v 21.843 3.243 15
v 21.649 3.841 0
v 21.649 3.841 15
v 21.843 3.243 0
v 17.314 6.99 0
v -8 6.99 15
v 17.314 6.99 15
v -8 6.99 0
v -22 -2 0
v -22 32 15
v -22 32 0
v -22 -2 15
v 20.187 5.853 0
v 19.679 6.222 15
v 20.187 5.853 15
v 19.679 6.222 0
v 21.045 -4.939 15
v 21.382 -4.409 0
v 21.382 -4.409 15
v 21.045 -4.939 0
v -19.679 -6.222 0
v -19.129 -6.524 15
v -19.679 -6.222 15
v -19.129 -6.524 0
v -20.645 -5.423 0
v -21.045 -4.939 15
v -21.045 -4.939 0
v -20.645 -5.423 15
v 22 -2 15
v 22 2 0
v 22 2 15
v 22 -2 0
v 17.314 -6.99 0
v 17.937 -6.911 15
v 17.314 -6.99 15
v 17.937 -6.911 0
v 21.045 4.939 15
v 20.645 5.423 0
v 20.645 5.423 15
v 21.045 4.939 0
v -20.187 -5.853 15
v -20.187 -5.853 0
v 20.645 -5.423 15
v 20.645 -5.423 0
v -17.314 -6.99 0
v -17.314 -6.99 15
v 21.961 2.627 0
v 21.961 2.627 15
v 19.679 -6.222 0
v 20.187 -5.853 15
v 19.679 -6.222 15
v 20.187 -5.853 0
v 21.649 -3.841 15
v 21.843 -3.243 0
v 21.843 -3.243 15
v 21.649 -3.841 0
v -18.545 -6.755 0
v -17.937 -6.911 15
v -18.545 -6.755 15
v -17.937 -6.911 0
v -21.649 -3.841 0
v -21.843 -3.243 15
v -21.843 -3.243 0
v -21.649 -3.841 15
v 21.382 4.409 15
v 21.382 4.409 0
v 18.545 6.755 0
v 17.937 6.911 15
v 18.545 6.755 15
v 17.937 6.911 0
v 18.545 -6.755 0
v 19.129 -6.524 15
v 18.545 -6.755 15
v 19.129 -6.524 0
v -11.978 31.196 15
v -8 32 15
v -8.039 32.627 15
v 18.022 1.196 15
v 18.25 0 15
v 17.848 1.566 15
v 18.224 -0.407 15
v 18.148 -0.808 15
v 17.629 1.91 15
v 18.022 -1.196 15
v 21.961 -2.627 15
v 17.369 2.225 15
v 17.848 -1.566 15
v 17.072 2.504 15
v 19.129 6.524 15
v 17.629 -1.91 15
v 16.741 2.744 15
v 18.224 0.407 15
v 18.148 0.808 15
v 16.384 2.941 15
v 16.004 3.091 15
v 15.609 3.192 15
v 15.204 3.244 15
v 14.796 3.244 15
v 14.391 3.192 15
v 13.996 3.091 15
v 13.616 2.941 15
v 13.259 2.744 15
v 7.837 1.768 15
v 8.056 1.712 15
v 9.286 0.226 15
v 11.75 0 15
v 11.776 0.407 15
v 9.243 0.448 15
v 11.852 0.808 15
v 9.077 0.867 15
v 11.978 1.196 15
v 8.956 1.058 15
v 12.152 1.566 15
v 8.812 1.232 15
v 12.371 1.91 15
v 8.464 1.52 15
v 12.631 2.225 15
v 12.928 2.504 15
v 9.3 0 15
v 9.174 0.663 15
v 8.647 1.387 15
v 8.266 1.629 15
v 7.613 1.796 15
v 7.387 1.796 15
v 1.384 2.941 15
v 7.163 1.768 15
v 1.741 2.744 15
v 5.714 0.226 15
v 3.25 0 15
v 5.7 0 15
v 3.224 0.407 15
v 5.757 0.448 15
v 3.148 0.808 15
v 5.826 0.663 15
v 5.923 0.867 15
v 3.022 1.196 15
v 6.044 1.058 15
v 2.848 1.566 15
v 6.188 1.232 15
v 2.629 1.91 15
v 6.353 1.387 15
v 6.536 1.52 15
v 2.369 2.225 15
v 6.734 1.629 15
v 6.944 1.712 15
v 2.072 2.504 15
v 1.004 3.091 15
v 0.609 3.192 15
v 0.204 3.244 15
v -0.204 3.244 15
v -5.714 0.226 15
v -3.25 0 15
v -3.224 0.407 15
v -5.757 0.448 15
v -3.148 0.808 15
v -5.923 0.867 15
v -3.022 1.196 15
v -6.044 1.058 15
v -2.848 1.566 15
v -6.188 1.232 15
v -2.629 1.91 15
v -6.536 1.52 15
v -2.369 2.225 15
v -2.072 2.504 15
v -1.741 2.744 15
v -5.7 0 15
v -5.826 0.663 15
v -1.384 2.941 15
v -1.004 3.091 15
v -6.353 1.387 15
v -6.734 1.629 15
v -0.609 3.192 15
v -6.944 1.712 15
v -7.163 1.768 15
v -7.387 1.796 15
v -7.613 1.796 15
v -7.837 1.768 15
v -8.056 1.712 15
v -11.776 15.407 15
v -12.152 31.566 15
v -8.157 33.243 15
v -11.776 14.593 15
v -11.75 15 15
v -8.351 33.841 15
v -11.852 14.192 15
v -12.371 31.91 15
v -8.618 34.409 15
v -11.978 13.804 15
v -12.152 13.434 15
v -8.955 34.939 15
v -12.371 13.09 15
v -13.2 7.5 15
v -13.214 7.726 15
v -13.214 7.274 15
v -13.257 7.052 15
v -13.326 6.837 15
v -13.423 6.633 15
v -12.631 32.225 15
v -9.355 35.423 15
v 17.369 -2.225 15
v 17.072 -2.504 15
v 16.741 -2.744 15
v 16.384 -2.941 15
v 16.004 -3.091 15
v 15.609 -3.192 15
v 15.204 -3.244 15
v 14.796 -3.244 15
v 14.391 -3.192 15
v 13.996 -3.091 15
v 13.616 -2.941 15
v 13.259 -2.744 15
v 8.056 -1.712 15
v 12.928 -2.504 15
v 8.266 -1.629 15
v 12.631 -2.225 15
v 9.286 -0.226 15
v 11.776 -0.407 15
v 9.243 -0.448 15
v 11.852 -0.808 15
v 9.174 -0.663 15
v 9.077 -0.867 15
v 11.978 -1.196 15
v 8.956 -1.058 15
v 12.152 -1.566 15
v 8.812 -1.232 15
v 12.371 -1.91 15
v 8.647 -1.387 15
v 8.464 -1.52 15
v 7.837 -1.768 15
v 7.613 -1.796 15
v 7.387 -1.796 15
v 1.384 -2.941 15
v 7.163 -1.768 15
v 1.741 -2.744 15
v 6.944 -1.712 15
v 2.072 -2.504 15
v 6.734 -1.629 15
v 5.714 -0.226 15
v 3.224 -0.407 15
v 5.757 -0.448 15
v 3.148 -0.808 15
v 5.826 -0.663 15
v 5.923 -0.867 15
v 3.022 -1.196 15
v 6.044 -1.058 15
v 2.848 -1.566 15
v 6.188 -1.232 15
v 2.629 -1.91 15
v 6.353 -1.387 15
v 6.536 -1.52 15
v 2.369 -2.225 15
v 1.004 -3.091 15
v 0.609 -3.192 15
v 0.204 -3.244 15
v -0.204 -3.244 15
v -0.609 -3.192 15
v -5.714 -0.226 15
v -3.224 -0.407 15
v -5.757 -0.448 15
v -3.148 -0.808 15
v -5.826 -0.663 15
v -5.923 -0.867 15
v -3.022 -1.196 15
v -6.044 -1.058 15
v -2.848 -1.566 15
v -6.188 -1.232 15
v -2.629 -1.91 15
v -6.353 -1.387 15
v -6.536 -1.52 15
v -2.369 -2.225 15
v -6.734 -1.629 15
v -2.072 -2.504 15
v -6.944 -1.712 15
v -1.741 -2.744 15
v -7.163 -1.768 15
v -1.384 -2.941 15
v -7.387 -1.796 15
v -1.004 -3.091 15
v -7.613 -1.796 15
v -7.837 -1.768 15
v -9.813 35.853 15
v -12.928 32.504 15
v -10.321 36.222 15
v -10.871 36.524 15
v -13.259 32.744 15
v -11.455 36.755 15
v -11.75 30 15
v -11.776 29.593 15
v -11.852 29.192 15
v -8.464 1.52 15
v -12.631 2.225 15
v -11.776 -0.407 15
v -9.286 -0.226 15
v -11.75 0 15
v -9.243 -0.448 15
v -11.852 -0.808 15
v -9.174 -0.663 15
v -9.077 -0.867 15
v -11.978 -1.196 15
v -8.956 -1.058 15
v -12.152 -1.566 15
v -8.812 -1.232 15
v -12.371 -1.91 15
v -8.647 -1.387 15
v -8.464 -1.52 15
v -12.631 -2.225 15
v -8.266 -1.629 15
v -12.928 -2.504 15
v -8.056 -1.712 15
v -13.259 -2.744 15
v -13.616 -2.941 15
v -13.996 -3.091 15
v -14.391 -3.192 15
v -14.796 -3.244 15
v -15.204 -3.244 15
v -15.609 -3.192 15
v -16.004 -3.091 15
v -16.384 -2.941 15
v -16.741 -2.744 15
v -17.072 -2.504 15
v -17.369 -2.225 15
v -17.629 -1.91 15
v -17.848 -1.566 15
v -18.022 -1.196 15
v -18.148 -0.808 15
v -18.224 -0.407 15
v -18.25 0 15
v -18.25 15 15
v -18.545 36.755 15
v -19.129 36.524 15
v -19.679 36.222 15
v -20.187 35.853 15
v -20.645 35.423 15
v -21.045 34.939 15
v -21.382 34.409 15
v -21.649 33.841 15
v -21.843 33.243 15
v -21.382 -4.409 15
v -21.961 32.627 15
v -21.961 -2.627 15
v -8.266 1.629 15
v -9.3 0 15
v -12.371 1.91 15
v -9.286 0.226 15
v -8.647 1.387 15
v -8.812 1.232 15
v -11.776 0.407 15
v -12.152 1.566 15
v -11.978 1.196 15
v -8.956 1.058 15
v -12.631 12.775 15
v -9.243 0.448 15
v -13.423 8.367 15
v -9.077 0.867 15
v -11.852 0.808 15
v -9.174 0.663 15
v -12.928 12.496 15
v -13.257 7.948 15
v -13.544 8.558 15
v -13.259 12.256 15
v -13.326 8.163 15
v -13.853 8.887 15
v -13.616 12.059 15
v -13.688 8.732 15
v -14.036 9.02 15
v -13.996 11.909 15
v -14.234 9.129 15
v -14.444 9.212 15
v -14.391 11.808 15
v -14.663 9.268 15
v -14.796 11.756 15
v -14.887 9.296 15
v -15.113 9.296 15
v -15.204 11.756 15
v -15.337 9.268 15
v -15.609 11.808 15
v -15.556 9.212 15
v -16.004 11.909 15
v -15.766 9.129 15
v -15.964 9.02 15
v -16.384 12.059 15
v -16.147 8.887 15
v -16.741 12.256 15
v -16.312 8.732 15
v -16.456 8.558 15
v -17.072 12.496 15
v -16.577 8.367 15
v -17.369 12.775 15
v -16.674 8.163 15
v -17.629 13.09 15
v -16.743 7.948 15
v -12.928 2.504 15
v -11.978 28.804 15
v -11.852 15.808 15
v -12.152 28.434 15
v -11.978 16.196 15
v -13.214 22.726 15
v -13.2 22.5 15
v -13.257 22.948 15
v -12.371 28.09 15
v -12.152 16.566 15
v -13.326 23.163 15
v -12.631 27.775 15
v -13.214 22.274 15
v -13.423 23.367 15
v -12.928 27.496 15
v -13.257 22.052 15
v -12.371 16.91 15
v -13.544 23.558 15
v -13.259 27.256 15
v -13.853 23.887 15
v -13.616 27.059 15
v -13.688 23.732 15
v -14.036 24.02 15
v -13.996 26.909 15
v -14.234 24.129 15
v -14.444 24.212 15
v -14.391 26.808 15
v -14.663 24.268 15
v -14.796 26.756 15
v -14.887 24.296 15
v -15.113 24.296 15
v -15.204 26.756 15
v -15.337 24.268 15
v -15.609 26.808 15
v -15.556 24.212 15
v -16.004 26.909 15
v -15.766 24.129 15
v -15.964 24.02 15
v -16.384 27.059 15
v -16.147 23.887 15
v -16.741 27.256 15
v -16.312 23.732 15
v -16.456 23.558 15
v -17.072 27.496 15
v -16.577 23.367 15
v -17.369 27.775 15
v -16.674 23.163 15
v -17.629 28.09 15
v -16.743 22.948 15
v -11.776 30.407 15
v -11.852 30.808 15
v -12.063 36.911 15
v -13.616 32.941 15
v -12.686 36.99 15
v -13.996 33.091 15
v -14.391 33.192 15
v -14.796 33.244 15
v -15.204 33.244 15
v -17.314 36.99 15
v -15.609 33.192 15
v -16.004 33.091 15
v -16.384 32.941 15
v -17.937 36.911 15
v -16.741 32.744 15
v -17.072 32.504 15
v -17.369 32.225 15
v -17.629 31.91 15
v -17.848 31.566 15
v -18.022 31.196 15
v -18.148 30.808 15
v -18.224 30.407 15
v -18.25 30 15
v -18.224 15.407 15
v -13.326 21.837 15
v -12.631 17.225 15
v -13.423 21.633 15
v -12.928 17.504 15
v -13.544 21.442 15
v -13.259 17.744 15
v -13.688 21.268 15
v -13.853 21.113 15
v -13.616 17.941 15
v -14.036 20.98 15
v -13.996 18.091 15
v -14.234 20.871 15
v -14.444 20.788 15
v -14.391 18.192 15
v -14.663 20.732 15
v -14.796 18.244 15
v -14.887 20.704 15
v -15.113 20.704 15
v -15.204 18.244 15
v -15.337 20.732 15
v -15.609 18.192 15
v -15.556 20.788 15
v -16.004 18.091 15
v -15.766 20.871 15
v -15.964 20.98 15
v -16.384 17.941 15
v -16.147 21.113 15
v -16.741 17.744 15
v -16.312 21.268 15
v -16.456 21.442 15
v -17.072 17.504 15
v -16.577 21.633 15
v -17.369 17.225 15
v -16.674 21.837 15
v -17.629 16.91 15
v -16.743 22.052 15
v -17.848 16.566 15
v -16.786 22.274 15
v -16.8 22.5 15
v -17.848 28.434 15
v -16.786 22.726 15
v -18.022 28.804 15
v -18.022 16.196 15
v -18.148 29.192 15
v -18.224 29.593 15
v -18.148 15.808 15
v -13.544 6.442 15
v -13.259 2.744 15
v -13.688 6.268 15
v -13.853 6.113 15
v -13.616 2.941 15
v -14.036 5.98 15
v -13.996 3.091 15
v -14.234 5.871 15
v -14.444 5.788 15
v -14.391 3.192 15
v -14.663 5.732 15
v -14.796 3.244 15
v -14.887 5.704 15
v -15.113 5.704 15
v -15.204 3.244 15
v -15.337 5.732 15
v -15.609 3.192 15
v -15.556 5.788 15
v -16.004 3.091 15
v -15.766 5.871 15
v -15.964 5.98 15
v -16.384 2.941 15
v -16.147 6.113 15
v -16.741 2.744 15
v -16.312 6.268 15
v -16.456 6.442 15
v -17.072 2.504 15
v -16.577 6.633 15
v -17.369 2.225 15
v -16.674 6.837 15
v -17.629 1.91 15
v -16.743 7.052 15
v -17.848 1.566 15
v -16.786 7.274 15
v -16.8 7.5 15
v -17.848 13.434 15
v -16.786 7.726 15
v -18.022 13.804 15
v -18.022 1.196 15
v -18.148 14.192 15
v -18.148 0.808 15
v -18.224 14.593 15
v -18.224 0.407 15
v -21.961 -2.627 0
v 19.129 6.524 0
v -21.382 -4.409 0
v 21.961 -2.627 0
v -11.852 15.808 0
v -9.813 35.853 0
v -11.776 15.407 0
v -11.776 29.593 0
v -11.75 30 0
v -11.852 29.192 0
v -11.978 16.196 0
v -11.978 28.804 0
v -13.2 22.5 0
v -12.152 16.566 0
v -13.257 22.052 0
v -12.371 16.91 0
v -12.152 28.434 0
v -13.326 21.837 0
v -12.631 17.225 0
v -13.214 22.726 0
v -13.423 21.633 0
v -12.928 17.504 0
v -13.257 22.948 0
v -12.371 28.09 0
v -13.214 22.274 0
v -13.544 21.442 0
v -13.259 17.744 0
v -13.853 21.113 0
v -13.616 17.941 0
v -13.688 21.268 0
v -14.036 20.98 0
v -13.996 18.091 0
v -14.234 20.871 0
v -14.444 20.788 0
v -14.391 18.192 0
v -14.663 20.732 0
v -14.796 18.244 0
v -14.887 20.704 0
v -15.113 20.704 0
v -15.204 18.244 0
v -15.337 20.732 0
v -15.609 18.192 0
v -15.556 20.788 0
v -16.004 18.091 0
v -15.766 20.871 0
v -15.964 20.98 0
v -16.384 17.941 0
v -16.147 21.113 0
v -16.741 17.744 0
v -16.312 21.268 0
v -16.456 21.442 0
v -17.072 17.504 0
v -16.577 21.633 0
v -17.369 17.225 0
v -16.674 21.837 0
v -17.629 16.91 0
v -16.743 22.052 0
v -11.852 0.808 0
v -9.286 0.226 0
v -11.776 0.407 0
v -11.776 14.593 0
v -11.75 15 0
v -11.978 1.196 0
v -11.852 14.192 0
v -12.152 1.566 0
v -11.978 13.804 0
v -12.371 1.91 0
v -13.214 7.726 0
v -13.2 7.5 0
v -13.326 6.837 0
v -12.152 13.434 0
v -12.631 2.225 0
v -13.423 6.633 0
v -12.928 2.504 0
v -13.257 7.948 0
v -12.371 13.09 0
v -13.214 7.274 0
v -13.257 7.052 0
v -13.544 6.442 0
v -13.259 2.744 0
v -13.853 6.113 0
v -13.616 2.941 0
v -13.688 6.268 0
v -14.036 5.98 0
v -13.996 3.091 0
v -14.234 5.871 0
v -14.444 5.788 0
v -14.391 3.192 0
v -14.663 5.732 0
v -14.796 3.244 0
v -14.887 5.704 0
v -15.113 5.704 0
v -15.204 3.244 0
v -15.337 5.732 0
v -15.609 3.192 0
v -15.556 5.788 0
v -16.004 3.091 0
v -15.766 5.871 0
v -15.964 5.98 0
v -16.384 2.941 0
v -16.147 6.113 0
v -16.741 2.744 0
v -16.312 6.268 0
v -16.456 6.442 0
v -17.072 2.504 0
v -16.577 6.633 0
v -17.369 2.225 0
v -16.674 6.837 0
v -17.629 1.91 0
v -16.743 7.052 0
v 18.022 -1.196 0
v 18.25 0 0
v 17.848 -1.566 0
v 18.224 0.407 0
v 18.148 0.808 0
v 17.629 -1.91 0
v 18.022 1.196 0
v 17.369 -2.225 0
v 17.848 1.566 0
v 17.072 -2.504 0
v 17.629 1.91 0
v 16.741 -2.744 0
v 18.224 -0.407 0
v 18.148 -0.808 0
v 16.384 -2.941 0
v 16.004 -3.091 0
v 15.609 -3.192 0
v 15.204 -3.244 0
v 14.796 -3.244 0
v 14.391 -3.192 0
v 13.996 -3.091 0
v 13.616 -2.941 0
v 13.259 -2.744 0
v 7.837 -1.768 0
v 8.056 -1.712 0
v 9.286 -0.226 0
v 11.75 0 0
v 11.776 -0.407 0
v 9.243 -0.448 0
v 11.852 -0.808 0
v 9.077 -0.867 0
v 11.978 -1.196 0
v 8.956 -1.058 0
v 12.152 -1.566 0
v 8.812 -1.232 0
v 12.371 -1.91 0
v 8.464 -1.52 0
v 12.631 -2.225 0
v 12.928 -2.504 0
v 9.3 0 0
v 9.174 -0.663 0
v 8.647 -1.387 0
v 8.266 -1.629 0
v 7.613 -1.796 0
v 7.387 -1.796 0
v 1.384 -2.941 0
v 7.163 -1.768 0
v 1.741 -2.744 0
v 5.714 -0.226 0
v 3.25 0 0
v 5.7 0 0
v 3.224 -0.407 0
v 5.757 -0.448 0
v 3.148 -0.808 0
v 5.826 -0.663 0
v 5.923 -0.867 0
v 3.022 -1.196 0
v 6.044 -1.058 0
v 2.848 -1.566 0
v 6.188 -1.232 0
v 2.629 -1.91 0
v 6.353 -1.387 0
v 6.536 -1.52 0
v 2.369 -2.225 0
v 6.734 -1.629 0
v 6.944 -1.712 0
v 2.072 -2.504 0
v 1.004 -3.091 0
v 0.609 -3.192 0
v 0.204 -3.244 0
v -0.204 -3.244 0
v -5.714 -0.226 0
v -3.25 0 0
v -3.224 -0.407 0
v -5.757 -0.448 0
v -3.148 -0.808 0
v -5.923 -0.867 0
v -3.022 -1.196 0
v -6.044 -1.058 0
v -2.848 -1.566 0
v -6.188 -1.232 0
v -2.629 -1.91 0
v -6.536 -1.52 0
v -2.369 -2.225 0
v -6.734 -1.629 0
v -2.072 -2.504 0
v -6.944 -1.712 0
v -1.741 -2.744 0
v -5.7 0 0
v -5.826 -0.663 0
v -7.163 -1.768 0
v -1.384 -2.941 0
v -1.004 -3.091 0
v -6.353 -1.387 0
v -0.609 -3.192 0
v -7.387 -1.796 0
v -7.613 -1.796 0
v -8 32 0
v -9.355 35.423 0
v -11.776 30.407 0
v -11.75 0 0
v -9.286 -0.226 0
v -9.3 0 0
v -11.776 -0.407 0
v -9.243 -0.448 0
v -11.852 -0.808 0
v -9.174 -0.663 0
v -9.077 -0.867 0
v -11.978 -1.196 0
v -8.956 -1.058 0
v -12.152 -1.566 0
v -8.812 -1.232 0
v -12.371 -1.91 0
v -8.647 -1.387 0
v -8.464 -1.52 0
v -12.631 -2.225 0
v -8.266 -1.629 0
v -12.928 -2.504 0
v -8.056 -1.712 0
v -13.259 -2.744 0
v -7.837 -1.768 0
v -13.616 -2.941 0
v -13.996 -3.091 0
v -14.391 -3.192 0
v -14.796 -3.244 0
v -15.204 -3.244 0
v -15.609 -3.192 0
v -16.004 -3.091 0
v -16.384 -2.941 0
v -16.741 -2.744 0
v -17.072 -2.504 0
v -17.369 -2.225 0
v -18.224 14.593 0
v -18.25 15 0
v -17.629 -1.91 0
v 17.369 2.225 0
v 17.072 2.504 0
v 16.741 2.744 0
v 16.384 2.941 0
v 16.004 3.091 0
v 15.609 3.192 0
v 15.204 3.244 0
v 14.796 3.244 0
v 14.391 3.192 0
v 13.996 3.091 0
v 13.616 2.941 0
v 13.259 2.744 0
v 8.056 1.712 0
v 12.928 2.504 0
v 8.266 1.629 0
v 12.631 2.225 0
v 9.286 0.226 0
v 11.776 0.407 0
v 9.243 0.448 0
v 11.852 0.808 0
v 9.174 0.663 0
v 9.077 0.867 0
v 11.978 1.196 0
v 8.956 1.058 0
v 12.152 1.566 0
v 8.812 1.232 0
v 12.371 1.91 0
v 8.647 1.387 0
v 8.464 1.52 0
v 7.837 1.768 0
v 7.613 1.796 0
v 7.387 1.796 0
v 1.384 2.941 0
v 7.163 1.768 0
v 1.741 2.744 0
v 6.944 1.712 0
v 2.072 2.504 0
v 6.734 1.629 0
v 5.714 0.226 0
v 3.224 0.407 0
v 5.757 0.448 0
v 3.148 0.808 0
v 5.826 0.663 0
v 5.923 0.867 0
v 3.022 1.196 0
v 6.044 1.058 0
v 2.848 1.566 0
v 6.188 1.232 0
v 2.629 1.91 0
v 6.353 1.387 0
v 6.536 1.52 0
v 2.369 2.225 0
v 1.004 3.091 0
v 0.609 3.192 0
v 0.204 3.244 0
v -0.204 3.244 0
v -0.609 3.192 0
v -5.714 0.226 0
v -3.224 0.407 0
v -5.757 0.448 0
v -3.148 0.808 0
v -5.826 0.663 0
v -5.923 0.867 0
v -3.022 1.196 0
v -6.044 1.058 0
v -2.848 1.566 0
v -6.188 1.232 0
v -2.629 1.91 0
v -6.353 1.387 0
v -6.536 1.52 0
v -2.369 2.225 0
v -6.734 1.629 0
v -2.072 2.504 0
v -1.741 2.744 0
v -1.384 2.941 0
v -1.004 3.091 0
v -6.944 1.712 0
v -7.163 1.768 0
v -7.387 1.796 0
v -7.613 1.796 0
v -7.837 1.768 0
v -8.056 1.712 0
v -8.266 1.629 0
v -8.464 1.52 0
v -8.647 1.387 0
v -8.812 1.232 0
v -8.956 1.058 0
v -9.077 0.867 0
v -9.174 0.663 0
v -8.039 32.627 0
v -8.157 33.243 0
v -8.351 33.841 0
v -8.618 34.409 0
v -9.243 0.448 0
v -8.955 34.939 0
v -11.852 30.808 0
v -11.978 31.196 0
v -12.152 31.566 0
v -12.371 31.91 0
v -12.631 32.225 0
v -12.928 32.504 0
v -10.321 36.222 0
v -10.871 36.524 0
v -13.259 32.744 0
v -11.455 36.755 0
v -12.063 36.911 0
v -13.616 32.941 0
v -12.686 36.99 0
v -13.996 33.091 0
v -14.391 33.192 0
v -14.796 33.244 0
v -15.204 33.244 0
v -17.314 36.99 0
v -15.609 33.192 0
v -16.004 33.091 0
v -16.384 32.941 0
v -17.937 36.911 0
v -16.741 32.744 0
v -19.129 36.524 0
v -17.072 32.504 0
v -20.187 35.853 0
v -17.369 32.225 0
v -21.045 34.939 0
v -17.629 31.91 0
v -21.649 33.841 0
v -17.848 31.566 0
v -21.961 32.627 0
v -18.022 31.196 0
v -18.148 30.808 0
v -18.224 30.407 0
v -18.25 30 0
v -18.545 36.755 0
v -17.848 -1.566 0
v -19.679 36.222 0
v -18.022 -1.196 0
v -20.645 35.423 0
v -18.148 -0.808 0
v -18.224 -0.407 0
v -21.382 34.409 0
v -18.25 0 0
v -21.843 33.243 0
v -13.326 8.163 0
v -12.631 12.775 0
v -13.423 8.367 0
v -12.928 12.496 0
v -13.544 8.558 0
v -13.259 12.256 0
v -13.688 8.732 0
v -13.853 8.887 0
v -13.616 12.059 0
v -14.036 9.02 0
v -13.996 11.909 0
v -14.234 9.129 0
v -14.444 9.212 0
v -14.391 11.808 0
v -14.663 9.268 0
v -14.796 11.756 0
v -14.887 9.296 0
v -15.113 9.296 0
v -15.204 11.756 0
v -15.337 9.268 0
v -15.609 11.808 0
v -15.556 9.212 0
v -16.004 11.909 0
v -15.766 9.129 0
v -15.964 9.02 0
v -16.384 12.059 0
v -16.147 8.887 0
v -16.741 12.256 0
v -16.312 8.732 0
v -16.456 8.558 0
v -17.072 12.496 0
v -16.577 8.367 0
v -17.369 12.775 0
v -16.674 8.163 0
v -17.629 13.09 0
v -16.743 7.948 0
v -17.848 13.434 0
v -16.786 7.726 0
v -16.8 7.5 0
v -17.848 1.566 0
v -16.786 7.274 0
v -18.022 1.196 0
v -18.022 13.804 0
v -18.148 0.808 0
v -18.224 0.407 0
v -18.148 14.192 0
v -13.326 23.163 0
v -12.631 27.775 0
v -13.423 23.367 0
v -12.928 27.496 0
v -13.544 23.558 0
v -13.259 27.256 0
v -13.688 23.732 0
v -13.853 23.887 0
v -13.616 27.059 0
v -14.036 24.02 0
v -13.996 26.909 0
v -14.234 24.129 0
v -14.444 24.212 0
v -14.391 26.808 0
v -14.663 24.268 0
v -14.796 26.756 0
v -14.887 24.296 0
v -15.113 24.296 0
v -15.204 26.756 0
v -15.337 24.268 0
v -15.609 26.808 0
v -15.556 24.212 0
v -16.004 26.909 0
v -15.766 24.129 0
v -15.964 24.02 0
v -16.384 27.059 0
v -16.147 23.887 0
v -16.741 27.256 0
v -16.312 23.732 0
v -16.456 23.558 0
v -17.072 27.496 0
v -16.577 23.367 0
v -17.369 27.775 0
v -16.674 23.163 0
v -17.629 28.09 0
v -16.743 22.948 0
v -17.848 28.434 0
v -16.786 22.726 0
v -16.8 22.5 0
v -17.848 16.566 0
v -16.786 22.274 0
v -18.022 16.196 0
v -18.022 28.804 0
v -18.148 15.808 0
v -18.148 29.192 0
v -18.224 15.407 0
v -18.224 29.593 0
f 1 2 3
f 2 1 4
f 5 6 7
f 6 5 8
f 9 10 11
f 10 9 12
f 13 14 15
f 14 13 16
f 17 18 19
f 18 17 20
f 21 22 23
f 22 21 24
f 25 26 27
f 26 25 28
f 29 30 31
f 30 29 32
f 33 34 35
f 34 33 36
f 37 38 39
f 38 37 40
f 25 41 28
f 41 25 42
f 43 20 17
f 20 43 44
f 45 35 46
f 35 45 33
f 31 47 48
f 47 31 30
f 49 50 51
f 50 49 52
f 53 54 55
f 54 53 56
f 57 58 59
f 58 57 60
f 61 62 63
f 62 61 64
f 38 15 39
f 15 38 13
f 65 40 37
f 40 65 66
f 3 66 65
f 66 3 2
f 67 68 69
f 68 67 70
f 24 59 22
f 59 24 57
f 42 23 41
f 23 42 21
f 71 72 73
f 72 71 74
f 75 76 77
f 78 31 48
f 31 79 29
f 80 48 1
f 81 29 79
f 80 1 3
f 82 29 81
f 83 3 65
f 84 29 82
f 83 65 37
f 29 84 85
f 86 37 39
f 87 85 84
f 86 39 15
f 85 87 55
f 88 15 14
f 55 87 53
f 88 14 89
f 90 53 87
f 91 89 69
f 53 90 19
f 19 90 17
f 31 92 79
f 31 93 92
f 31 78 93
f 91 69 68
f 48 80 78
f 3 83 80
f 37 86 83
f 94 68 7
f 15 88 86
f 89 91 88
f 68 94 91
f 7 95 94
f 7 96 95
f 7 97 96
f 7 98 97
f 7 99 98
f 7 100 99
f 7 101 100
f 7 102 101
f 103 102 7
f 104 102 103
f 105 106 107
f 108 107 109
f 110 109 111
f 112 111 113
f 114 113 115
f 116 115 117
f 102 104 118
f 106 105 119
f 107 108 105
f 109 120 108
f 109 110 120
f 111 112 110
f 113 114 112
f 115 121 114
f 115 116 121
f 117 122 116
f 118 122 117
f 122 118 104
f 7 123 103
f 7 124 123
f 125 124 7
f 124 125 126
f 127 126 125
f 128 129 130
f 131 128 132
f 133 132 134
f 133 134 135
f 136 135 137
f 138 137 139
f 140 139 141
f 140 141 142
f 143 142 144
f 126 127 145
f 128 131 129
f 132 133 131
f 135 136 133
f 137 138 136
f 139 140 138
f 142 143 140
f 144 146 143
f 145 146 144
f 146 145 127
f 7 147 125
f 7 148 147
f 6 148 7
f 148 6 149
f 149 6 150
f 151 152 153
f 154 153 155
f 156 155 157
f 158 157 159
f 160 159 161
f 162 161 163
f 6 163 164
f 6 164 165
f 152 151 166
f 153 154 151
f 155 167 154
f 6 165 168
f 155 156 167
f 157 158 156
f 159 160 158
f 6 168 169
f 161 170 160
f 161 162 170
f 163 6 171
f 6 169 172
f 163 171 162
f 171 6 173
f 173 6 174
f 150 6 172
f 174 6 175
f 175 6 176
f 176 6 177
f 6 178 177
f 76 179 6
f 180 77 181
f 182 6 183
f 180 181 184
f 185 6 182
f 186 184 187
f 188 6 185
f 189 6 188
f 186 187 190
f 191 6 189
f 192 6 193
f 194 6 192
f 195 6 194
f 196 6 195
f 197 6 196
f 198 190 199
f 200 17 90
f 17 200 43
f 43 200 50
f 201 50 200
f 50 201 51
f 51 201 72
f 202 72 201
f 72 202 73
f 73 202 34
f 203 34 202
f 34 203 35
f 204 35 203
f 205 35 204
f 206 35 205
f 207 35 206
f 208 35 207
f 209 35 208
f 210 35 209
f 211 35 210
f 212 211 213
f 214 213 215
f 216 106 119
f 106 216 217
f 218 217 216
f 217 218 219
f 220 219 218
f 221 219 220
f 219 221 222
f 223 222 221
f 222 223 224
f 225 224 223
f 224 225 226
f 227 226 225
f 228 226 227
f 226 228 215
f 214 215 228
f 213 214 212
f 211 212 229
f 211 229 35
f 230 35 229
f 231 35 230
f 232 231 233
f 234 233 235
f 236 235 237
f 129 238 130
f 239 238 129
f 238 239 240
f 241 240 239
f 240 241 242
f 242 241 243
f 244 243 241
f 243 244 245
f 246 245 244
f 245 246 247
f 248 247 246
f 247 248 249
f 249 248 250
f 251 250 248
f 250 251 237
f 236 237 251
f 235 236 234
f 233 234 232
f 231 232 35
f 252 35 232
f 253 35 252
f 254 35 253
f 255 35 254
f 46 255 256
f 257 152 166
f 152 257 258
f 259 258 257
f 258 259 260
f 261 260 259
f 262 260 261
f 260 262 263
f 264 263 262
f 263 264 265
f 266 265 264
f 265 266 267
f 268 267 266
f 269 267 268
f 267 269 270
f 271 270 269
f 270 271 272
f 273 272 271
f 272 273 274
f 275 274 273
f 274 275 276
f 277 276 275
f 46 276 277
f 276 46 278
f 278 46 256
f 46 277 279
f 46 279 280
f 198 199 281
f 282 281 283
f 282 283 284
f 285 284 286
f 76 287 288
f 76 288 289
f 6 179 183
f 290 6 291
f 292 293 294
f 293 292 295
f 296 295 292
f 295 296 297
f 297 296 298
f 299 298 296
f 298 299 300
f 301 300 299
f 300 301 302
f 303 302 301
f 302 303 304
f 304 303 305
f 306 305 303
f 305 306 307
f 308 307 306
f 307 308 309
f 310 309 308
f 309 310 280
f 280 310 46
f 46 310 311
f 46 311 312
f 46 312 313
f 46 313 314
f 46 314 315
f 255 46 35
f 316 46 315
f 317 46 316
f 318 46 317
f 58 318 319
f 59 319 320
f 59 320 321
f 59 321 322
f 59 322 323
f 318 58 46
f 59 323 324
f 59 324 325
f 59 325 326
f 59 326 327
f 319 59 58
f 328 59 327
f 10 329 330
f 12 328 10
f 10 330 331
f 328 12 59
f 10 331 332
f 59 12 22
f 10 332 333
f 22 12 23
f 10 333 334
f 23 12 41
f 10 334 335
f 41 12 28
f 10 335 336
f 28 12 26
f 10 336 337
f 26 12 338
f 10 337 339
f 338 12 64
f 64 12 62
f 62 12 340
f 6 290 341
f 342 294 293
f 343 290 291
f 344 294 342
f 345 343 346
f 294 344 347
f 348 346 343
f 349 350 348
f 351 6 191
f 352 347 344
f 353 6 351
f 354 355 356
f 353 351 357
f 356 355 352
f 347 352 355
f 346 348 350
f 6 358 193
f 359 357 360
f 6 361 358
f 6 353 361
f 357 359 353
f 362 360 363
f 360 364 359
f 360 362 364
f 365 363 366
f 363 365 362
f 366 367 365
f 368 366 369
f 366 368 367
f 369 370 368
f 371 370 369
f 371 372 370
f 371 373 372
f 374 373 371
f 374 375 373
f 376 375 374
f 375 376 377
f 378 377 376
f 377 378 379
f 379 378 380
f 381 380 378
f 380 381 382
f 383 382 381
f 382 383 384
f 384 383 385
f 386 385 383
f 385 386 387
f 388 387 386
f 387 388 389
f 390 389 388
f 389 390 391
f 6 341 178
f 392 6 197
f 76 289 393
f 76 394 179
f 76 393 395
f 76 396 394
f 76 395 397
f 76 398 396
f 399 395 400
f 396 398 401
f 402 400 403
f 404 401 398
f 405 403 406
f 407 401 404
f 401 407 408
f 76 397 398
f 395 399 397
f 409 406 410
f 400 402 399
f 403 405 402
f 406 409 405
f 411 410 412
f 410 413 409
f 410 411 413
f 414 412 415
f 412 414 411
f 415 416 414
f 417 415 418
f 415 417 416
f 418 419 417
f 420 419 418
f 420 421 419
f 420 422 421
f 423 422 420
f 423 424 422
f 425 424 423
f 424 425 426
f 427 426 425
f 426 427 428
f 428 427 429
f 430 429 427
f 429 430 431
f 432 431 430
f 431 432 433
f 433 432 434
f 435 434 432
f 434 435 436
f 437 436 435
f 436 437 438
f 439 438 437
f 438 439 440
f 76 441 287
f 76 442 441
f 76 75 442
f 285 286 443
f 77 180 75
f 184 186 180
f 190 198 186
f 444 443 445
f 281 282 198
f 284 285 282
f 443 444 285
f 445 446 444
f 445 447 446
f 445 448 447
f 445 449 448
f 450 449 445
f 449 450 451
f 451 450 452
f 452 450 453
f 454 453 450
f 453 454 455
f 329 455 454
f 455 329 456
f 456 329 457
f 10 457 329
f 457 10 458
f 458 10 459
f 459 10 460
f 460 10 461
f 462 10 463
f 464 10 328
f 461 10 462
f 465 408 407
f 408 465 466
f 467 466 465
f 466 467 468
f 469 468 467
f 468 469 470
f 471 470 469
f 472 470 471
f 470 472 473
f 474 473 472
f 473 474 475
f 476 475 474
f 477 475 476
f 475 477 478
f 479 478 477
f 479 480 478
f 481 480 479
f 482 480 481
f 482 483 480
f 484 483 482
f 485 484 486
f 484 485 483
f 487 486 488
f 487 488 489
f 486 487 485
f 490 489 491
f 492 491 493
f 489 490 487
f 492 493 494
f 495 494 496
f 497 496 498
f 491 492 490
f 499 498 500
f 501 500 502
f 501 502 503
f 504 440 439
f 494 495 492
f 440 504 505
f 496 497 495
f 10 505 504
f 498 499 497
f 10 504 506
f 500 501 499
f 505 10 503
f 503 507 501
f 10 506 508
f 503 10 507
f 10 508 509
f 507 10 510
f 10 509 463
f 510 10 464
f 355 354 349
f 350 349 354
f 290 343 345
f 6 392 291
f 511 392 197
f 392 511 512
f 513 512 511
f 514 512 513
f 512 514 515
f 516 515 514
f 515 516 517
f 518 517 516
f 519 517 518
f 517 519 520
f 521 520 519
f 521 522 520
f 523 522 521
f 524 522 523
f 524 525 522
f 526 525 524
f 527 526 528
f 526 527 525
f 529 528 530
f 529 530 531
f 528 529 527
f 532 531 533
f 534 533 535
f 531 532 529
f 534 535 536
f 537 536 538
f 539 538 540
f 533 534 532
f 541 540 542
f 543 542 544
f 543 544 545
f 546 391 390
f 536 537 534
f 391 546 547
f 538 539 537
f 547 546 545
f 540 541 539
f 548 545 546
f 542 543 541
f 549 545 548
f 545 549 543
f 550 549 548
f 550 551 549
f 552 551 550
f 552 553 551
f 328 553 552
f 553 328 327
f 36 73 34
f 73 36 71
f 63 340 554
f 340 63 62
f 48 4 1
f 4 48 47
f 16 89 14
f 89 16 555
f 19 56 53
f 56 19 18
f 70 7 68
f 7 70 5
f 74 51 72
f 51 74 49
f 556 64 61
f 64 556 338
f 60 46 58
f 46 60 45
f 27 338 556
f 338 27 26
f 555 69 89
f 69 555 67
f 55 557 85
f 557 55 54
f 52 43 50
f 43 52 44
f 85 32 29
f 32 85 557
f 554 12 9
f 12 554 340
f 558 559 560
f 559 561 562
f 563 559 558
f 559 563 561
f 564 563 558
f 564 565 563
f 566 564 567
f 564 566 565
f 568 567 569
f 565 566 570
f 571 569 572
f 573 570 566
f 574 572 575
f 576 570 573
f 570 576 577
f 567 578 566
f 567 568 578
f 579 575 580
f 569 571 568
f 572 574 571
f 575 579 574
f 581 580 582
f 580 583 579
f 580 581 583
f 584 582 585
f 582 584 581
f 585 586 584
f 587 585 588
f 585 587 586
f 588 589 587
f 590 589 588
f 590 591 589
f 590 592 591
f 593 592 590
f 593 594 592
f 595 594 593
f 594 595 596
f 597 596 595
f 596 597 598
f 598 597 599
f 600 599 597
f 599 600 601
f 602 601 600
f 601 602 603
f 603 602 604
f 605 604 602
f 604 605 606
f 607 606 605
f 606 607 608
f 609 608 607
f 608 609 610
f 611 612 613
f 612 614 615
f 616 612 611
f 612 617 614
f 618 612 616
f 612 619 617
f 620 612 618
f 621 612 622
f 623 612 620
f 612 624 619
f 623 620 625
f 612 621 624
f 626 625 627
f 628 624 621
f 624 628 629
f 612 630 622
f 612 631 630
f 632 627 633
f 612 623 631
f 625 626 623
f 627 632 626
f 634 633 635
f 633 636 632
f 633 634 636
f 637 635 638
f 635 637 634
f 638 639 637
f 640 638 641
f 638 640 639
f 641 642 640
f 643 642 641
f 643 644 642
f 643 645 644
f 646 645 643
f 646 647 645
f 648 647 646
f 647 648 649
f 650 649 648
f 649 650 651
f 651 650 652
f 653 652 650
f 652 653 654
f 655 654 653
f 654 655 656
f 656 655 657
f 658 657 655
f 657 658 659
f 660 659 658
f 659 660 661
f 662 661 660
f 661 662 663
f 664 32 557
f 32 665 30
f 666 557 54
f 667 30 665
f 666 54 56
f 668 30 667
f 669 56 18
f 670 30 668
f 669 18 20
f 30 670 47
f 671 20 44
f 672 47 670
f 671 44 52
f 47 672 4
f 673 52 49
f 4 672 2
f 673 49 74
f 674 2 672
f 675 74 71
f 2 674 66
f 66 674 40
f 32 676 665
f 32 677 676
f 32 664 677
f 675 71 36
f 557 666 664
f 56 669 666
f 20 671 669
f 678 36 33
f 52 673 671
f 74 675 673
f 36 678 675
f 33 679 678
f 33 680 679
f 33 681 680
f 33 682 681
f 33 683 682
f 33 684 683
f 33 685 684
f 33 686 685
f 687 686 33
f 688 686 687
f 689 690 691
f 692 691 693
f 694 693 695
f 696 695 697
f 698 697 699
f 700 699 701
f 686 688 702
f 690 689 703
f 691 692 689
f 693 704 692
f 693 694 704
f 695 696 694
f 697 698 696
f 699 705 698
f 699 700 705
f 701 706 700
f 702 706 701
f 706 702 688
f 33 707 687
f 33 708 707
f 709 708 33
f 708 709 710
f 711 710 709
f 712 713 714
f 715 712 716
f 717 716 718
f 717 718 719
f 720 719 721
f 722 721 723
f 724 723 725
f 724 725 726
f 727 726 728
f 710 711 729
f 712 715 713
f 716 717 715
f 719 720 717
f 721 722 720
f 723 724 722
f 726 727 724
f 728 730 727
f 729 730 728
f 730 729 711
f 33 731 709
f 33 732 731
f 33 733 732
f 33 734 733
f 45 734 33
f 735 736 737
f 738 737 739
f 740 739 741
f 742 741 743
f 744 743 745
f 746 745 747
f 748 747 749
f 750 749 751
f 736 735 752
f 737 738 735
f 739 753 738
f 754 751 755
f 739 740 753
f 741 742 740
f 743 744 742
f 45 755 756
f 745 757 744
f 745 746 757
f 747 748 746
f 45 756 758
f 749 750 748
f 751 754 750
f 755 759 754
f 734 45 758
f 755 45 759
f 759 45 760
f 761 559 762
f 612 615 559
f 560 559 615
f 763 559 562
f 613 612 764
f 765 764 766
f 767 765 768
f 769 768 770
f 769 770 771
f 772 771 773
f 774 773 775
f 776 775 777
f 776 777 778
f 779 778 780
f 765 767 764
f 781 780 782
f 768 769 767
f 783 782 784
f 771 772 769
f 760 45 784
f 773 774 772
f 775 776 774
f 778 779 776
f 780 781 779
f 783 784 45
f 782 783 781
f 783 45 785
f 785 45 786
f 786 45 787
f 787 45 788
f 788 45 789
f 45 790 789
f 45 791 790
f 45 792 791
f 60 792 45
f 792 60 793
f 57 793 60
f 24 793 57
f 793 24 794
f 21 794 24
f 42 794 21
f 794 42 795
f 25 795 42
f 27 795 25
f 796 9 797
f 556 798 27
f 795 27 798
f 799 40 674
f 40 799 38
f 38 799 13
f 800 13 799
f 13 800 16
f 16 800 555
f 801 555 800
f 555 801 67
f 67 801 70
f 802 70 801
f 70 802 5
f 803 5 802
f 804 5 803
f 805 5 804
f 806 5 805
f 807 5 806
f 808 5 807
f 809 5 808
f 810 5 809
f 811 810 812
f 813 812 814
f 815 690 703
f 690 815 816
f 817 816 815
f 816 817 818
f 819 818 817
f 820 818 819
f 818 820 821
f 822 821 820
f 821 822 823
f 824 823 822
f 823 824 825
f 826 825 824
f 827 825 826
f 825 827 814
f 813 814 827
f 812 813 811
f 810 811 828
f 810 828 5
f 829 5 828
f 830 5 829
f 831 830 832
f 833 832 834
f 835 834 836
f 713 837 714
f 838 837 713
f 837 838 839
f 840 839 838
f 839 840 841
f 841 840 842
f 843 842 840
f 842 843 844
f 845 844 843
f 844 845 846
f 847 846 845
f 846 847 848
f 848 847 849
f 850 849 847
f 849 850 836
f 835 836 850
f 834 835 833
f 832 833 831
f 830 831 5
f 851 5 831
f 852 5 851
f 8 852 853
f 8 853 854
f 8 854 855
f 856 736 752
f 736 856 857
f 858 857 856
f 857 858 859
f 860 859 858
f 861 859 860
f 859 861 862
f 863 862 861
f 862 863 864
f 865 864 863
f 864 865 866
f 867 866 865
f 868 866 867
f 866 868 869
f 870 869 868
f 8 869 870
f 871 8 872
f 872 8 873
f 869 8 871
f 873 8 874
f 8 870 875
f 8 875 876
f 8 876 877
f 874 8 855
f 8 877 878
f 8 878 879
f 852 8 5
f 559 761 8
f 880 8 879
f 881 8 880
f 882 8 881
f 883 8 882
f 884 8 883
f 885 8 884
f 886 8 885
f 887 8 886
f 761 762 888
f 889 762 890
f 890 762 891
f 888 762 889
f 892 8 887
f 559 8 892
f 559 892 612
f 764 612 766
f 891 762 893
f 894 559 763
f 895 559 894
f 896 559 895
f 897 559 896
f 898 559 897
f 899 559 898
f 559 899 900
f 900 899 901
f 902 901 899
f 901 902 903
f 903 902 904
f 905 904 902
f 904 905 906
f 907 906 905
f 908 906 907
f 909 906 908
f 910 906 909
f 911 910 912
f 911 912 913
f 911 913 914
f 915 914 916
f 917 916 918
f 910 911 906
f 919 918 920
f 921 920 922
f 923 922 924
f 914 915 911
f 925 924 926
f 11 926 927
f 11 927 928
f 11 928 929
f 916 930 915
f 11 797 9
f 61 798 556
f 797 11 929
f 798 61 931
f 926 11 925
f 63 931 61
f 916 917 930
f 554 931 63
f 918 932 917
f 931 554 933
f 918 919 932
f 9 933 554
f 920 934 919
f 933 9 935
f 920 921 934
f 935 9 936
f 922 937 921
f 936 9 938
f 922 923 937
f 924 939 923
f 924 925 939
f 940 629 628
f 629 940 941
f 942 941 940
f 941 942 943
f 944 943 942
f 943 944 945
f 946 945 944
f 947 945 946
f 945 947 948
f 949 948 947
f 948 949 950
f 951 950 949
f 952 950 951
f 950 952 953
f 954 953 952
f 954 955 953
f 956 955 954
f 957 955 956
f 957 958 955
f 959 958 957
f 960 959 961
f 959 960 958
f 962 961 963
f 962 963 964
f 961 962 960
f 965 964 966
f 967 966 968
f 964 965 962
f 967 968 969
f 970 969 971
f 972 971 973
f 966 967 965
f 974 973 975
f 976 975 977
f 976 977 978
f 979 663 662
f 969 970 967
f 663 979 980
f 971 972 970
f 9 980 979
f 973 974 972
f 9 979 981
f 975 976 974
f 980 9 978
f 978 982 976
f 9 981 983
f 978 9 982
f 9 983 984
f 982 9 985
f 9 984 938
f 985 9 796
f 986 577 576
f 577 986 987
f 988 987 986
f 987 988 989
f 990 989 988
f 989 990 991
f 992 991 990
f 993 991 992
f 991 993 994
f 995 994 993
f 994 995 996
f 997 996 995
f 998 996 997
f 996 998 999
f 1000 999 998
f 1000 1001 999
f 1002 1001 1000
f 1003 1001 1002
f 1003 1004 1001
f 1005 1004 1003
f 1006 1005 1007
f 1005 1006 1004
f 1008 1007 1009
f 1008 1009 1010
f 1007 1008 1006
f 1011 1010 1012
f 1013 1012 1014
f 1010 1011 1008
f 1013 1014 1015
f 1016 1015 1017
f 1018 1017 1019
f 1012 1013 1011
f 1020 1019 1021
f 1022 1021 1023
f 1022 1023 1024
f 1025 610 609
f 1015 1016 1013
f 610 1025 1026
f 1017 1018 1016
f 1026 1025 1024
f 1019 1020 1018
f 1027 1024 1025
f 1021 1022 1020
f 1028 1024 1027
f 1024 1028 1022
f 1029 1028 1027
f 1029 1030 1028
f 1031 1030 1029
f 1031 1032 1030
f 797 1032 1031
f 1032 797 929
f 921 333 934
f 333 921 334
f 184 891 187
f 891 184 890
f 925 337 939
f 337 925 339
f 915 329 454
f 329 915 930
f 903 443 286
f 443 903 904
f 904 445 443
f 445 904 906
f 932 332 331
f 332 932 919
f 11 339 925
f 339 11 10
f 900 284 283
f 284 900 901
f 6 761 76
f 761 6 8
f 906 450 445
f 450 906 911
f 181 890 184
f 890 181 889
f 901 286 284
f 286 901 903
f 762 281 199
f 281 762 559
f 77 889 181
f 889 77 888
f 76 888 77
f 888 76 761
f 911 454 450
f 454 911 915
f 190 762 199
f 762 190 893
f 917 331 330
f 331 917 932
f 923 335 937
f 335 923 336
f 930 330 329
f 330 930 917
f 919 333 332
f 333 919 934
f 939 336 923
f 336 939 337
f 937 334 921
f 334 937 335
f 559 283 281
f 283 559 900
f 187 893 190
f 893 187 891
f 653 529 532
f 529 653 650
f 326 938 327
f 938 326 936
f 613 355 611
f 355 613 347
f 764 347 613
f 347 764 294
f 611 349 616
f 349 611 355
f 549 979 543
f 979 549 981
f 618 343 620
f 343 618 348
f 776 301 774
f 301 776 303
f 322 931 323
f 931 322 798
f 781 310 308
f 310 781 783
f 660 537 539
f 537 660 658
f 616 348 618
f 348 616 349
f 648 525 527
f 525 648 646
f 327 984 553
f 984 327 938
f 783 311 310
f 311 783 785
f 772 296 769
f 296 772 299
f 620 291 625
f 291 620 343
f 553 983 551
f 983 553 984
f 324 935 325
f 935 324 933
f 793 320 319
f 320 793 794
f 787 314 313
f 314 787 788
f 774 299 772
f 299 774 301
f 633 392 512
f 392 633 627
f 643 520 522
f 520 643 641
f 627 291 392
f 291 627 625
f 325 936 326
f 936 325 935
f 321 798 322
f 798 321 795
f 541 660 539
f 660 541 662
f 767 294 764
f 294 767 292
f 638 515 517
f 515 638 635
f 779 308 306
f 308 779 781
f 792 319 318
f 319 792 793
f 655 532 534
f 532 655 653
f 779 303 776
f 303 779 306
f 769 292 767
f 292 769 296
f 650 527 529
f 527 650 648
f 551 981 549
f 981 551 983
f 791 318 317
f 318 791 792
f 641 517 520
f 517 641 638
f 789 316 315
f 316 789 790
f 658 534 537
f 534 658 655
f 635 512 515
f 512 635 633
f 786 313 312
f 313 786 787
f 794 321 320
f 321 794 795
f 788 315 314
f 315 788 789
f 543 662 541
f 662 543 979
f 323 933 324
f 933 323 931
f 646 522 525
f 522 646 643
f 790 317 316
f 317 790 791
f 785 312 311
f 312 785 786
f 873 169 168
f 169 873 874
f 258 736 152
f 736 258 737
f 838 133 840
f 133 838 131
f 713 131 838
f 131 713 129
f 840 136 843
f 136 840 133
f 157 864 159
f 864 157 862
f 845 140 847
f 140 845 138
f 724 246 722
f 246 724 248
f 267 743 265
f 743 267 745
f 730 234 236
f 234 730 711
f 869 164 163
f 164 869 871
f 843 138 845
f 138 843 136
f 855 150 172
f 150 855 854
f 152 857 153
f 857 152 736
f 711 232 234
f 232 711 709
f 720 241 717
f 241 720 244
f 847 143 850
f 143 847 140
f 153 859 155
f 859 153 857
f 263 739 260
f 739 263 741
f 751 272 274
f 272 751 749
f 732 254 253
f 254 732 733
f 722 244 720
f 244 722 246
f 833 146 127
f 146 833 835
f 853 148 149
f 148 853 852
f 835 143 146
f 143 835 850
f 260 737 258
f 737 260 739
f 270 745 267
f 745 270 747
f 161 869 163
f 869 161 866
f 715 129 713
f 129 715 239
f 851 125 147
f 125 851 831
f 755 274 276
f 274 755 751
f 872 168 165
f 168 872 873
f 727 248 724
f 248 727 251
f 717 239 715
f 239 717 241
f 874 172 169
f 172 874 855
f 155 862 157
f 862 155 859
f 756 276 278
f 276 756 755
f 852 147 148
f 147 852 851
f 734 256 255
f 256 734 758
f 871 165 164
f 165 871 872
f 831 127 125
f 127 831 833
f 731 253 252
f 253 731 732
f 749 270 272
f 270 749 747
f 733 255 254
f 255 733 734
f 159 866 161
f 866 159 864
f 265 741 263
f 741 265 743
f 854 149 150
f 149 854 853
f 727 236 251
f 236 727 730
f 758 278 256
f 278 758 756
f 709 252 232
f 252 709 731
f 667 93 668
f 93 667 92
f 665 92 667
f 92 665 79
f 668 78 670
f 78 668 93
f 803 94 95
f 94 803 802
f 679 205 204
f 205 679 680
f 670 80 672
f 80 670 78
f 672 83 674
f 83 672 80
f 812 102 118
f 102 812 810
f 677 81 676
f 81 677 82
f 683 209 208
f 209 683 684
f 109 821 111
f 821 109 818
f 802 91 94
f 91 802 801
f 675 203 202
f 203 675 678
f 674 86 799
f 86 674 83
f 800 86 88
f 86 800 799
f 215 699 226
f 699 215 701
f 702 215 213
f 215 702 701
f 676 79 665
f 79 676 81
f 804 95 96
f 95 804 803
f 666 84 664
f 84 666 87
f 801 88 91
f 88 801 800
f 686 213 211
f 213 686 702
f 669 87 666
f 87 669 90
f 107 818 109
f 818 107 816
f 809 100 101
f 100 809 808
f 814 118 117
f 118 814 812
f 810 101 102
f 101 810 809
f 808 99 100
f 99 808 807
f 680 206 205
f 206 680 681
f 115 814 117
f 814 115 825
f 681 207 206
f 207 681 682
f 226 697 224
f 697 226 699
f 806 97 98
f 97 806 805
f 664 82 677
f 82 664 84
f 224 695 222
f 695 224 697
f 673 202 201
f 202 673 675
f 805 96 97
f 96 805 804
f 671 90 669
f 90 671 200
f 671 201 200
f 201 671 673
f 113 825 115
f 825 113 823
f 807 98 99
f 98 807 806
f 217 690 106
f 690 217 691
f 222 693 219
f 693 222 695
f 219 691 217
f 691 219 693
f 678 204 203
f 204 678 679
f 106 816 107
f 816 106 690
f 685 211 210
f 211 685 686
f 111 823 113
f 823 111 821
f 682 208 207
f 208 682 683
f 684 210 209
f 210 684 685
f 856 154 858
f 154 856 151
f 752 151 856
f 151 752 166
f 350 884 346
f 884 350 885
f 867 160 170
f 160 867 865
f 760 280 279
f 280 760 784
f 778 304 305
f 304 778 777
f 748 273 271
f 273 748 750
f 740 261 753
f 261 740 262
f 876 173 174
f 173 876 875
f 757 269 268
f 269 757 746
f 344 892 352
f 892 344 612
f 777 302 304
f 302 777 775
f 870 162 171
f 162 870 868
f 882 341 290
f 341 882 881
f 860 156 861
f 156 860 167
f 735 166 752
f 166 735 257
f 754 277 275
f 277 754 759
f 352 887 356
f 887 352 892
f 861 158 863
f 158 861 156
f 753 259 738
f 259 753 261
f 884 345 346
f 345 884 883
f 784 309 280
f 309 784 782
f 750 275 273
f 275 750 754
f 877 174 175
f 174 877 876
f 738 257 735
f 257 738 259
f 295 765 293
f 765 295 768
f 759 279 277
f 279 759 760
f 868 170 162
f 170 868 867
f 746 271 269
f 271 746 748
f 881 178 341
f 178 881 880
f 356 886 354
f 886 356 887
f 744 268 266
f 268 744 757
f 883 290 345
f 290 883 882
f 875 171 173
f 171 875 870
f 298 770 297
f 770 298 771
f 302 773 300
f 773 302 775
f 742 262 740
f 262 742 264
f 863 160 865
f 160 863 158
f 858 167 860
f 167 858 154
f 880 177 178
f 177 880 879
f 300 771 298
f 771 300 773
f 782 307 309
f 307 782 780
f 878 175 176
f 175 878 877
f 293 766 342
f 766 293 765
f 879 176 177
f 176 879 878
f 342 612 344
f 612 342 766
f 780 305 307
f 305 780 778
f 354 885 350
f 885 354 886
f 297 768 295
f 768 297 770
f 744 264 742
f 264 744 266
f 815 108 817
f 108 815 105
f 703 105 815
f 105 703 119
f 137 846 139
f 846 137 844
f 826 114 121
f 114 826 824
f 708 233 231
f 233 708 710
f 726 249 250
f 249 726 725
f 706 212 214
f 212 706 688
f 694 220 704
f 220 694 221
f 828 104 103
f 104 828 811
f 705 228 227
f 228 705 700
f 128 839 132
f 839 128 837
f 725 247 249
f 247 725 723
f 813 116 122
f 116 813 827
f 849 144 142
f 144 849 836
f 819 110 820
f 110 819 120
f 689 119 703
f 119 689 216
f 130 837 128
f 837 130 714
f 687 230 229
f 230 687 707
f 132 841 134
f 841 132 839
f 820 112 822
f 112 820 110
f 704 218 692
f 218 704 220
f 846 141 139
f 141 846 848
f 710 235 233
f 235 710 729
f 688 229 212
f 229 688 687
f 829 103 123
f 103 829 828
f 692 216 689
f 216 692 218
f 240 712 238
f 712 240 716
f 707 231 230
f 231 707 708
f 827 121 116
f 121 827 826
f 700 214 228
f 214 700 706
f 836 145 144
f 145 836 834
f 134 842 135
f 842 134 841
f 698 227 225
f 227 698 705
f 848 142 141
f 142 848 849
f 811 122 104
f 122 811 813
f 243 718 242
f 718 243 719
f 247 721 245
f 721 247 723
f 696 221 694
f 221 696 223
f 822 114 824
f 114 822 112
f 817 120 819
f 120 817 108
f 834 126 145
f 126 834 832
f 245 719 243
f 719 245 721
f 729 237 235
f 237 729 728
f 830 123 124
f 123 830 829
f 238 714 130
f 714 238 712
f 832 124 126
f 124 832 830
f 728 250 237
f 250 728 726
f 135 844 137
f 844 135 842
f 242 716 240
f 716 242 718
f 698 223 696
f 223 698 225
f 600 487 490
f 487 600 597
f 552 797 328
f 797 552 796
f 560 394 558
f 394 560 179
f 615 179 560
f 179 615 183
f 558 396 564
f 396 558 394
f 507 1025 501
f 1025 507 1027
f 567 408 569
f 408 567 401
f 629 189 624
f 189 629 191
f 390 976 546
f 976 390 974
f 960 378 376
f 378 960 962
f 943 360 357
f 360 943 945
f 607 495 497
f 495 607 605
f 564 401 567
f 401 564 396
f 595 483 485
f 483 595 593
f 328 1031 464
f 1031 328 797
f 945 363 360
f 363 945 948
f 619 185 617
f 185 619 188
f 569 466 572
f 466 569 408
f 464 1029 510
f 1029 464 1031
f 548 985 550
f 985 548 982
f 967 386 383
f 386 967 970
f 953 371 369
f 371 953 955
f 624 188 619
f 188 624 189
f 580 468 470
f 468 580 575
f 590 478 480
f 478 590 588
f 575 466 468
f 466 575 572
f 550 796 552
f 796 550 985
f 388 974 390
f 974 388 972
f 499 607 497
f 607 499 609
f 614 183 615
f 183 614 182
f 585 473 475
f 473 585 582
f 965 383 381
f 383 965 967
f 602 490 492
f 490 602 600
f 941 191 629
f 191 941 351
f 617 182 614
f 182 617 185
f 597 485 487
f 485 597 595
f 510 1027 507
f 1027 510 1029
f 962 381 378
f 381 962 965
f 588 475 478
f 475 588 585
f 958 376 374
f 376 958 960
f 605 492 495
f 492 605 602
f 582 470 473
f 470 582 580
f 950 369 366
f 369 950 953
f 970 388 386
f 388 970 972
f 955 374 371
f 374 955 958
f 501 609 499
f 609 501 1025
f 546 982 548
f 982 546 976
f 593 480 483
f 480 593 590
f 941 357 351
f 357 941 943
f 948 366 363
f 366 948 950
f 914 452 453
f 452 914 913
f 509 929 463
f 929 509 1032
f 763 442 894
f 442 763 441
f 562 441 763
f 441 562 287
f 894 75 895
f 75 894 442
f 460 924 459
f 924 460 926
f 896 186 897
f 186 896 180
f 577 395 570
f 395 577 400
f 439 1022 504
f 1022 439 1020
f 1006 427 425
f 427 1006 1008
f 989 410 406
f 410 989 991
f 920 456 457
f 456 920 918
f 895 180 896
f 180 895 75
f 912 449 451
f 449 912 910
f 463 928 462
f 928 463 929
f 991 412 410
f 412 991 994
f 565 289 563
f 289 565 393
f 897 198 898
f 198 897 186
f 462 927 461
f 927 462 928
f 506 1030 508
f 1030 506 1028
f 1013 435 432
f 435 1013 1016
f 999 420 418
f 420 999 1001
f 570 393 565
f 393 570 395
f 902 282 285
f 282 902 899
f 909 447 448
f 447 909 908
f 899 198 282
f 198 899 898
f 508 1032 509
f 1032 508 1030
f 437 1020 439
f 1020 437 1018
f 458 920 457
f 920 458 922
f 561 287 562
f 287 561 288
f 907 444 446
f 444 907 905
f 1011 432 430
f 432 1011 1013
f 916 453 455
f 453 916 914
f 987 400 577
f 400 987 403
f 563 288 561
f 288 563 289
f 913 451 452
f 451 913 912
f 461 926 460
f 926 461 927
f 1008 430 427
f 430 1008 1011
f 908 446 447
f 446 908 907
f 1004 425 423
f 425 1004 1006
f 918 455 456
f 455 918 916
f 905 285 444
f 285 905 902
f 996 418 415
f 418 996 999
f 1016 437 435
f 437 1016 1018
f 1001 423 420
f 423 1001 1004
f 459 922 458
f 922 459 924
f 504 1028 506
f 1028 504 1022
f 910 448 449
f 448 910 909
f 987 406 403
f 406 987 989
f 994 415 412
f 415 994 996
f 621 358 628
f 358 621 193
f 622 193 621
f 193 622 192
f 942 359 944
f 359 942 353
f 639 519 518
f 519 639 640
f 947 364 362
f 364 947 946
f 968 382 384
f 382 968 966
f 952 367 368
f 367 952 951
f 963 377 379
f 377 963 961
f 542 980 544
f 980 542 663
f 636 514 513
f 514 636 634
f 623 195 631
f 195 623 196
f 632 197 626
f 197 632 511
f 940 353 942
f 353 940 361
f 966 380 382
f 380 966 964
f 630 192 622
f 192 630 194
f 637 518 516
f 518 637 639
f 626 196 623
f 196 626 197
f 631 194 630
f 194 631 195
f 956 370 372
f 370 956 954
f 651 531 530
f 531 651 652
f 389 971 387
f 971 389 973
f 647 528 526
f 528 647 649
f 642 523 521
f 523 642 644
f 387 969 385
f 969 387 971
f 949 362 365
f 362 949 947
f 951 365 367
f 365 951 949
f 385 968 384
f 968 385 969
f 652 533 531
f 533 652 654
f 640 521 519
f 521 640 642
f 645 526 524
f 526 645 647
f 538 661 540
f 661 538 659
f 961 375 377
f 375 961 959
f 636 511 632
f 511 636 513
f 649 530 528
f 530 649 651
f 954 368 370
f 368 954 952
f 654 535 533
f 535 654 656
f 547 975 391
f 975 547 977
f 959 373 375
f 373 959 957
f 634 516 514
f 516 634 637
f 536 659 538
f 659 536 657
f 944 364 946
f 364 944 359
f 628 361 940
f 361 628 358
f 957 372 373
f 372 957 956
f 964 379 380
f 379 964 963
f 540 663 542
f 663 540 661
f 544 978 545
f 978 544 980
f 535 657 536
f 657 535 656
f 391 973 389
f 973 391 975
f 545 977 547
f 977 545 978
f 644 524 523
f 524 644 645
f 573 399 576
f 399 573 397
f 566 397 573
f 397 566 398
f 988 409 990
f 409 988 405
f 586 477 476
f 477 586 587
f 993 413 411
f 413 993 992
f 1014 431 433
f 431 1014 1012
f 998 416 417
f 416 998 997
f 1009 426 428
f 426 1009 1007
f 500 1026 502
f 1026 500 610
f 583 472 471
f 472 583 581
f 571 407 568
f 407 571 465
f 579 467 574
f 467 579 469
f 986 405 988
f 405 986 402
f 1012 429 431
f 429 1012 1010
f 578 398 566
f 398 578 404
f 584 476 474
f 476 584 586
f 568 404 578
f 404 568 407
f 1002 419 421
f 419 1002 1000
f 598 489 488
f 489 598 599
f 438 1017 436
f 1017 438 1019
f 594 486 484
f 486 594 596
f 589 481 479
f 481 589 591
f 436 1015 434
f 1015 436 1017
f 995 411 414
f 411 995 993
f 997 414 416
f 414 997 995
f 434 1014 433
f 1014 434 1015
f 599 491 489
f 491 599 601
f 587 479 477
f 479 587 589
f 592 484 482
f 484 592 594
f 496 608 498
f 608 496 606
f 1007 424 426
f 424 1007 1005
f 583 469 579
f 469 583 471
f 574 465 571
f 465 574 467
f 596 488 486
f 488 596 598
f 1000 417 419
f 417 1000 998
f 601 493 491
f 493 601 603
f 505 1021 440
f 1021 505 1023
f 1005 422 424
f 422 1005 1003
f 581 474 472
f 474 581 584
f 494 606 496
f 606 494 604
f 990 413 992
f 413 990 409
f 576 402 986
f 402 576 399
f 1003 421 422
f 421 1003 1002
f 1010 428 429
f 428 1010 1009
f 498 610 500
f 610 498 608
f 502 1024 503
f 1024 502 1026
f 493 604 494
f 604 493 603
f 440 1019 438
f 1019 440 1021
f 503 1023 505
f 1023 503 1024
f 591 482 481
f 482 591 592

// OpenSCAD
$fn = 50;


difference() {
	union() {
		*color(alpha = 1.0000000000, c = "gray") {
			translate(v = [0, 7, 0]) {
				linear_extrude(height = 1) {
					text(font = "Arial:style=Bold", halign = "center", size = 4.5000000000, text = "COMMENT plate main", valign = "center");
				}
			}
		}
		*color(alpha = 1.0000000000, c = "gray") {
			translate(v = [0, 14, 0]) {
				linear_extrude(height = 1) {
					text(font = "Arial:style=Bold", halign = "center", size = 4.5000000000, text = "COMMENT description oobb_plate_shape_p_type_15_depth_3_width_1_height_15_thickness_false_full_object", valign = "center");
				}
			}
		}
		hull() {
			translate(v = [-17.0000000000, 2.0000000000, 0]) {
				cylinder(h = 15, r = 5);
			}
			translate(v = [17.0000000000, 2.0000000000, 0]) {
				cylinder(h = 15, r = 5);
			}
			translate(v = [-17.0000000000, -2.0000000000, 0]) {
				cylinder(h = 15, r = 5);
			}
			translate(v = [17.0000000000, -2.0000000000, 0]) {
				cylinder(h = 15, r = 5);
			}
		}
		*color(alpha = 1.0000000000, c = "gray") {
			translate(v = [0, 7, 0]) {
				linear_extrude(height = 1) {
					text(font = "Arial:style=Bold", halign = "center", size = 4.5000000000, text = "COMMENT plate main", valign = "center");
				}
			}
		}
		*color(alpha = 1.0000000000, c = "gray") {
			translate(v = [-15.0000000000, 29.0000000000, 0]) {
				linear_extrude(height = 3) {
					text(font = "Arial:style=Bold", halign = "center", size = 4.5000000000, text = "COMMENT description oobb_plate_shape_p_type_15_depth_-15.0_15.0_0_pos_1_width_3_height_15_thickness_false_full_object", valign = "center");
				}
			}
		}
		translate(v = [-15.0000000000, 15.0000000000, 0]) {
			hull() {
				translate(v = [-2.0000000000, 17.0000000000, 0]) {
					cylinder(h = 15, r = 5);
				}
				translate(v = [2.0000000000, 17.0000000000, 0]) {
					cylinder(h = 15, r = 5);
				}
				translate(v = [-2.0000000000, -17.0000000000, 0]) {
					cylinder(h = 15, r = 5);
				}
				translate(v = [2.0000000000, -17.0000000000, 0]) {
					cylinder(h = 15, r = 5);
				}
			}
		}
	}
	union() {
		*color(alpha = 1.0000000000, c = "gray") {
			translate(v = [0, 7, 0]) {
				linear_extrude(height = 1) {
					text(font = "Arial:style=Bold", halign = "center", size = 4.5000000000, text = "COMMENT holes main", valign = "center");
				}
			}
		}
		*color(alpha = 1.0000000000, c = "gray") {
			translate(v = [0, 14, 0]) {
				linear_extrude(height = 1) {
					text(font = "Arial:style=Bold", halign = "center", size = 4.5000000000, text = "COMMENT description oobb_holes_shape_n_type_3_width_1_height_15_thickness_false_full_object_true_both_holes", valign = "center");
				}
			}
		}
		translate(v = [-15.0000000000, 0.0000000000, 0]) {
			translate(v = [0, 0, -50]) {
				cylinder(h = 100, r = 3.2500000000);
			}
		}
		translate(v = [0, 0, -50]) {
			cylinder(h = 100, r = 3.2500000000);
		}
		translate(v = [15.0000000000, 0.0000000000, 0]) {
			translate(v = [0, 0, -50]) {
				cylinder(h = 100, r = 3.2500000000);
			}
		}
		translate(v = [-15.0000000000, 0.0000000000, 0]) {
			translate(v = [0, 0, -50]) {
				cylinder(h = 100, r = 1.8000000000);
			}
		}
		translate(v = [-7.5000000000, 0.0000000000, 0]) {
			translate(v = [0, 0, -50]) {
				cylinder(h = 100, r = 1.8000000000);
			}
		}
		translate(v = [0, 0, -50]) {
			cylinder(h = 100, r = 1.8000000000);
		}
		translate(v = [7.5000000000, 0.0000000000, 0]) {
			translate(v = [0, 0, -50]) {
				cylinder(h = 100, r = 1.8000000000);
			}
		}
		translate(v = [15.0000000000, 0.0000000000, 0]) {
			translate(v = [0, 0, -50]) {
				cylinder(h = 100, r = 1.8000000000);
			}
		}
		*color(alpha = 1.0000000000, c = "gray") {
			translate(v = [0, 7, 0]) {
				linear_extrude(height = 1) {
					text(font = "Arial:style=Bold", halign = "center", size = 4.5000000000, text = "COMMENT holes main", valign = "center");
				}
			}
		}
		*color(alpha = 1.0000000000, c = "gray") {
			translate(v = [-15.0000000000, 29.0000000000, 0]) {
				linear_extrude(height = 3) {
					text(font = "Arial:style=Bold", halign = "center", size = 4.5000000000, text = "COMMENT description oobb_holes_shape_n_type_-15.0_15.0_0_pos_1_width_3_height_15_thickness_false_full_object_true_both_holes", valign = "center");
				}
			}
		}
		translate(v = [-15.0000000000, 0.0000000000, 0]) {
			translate(v = [0, 0, -50]) {
				cylinder(h = 100, r = 3.2500000000);
			}
		}
		translate(v = [-15.0000000000, 15.0000000000, 0]) {
			translate(v = [0, 0, -50]) {
				cylinder(h = 100, r = 3.2500000000);
			}
		}
		translate(v = [-15.0000000000, 30.0000000000, 0]) {
			translate(v = [0, 0, -50]) {
				cylinder(h = 100, r = 3.2500000000);
			}
		}
		translate(v = [-15.0000000000, 0.0000000000, 0]) {
			translate(v = [0, 0, -50]) {
				cylinder(h = 100, r = 1.8000000000);
			}
		}
		translate(v = [-15.0000000000, 7.5000000000, 0]) {
			translate(v = [0, 0, -50]) {
				cylinder(h = 100, r = 1.8000000000);
			}
		}
		translate(v = [-15.0000000000, 15.0000000000, 0]) {
			translate(v = [0, 0, -50]) {
				cylinder(h = 100, r = 1.8000000000);
			}
		}
		translate(v = [-15.0000000000, 22.5000000000, 0]) {
			translate(v = [0, 0, -50]) {
				cylinder(h = 100, r = 1.8000000000);
			}
		}
		translate(v = [-15.0000000000, 30.0000000000, 0]) {
			translate(v = [0, 0, -50]) {
				cylinder(h = 100, r = 1.8000000000);
			}
		}
	}
}
